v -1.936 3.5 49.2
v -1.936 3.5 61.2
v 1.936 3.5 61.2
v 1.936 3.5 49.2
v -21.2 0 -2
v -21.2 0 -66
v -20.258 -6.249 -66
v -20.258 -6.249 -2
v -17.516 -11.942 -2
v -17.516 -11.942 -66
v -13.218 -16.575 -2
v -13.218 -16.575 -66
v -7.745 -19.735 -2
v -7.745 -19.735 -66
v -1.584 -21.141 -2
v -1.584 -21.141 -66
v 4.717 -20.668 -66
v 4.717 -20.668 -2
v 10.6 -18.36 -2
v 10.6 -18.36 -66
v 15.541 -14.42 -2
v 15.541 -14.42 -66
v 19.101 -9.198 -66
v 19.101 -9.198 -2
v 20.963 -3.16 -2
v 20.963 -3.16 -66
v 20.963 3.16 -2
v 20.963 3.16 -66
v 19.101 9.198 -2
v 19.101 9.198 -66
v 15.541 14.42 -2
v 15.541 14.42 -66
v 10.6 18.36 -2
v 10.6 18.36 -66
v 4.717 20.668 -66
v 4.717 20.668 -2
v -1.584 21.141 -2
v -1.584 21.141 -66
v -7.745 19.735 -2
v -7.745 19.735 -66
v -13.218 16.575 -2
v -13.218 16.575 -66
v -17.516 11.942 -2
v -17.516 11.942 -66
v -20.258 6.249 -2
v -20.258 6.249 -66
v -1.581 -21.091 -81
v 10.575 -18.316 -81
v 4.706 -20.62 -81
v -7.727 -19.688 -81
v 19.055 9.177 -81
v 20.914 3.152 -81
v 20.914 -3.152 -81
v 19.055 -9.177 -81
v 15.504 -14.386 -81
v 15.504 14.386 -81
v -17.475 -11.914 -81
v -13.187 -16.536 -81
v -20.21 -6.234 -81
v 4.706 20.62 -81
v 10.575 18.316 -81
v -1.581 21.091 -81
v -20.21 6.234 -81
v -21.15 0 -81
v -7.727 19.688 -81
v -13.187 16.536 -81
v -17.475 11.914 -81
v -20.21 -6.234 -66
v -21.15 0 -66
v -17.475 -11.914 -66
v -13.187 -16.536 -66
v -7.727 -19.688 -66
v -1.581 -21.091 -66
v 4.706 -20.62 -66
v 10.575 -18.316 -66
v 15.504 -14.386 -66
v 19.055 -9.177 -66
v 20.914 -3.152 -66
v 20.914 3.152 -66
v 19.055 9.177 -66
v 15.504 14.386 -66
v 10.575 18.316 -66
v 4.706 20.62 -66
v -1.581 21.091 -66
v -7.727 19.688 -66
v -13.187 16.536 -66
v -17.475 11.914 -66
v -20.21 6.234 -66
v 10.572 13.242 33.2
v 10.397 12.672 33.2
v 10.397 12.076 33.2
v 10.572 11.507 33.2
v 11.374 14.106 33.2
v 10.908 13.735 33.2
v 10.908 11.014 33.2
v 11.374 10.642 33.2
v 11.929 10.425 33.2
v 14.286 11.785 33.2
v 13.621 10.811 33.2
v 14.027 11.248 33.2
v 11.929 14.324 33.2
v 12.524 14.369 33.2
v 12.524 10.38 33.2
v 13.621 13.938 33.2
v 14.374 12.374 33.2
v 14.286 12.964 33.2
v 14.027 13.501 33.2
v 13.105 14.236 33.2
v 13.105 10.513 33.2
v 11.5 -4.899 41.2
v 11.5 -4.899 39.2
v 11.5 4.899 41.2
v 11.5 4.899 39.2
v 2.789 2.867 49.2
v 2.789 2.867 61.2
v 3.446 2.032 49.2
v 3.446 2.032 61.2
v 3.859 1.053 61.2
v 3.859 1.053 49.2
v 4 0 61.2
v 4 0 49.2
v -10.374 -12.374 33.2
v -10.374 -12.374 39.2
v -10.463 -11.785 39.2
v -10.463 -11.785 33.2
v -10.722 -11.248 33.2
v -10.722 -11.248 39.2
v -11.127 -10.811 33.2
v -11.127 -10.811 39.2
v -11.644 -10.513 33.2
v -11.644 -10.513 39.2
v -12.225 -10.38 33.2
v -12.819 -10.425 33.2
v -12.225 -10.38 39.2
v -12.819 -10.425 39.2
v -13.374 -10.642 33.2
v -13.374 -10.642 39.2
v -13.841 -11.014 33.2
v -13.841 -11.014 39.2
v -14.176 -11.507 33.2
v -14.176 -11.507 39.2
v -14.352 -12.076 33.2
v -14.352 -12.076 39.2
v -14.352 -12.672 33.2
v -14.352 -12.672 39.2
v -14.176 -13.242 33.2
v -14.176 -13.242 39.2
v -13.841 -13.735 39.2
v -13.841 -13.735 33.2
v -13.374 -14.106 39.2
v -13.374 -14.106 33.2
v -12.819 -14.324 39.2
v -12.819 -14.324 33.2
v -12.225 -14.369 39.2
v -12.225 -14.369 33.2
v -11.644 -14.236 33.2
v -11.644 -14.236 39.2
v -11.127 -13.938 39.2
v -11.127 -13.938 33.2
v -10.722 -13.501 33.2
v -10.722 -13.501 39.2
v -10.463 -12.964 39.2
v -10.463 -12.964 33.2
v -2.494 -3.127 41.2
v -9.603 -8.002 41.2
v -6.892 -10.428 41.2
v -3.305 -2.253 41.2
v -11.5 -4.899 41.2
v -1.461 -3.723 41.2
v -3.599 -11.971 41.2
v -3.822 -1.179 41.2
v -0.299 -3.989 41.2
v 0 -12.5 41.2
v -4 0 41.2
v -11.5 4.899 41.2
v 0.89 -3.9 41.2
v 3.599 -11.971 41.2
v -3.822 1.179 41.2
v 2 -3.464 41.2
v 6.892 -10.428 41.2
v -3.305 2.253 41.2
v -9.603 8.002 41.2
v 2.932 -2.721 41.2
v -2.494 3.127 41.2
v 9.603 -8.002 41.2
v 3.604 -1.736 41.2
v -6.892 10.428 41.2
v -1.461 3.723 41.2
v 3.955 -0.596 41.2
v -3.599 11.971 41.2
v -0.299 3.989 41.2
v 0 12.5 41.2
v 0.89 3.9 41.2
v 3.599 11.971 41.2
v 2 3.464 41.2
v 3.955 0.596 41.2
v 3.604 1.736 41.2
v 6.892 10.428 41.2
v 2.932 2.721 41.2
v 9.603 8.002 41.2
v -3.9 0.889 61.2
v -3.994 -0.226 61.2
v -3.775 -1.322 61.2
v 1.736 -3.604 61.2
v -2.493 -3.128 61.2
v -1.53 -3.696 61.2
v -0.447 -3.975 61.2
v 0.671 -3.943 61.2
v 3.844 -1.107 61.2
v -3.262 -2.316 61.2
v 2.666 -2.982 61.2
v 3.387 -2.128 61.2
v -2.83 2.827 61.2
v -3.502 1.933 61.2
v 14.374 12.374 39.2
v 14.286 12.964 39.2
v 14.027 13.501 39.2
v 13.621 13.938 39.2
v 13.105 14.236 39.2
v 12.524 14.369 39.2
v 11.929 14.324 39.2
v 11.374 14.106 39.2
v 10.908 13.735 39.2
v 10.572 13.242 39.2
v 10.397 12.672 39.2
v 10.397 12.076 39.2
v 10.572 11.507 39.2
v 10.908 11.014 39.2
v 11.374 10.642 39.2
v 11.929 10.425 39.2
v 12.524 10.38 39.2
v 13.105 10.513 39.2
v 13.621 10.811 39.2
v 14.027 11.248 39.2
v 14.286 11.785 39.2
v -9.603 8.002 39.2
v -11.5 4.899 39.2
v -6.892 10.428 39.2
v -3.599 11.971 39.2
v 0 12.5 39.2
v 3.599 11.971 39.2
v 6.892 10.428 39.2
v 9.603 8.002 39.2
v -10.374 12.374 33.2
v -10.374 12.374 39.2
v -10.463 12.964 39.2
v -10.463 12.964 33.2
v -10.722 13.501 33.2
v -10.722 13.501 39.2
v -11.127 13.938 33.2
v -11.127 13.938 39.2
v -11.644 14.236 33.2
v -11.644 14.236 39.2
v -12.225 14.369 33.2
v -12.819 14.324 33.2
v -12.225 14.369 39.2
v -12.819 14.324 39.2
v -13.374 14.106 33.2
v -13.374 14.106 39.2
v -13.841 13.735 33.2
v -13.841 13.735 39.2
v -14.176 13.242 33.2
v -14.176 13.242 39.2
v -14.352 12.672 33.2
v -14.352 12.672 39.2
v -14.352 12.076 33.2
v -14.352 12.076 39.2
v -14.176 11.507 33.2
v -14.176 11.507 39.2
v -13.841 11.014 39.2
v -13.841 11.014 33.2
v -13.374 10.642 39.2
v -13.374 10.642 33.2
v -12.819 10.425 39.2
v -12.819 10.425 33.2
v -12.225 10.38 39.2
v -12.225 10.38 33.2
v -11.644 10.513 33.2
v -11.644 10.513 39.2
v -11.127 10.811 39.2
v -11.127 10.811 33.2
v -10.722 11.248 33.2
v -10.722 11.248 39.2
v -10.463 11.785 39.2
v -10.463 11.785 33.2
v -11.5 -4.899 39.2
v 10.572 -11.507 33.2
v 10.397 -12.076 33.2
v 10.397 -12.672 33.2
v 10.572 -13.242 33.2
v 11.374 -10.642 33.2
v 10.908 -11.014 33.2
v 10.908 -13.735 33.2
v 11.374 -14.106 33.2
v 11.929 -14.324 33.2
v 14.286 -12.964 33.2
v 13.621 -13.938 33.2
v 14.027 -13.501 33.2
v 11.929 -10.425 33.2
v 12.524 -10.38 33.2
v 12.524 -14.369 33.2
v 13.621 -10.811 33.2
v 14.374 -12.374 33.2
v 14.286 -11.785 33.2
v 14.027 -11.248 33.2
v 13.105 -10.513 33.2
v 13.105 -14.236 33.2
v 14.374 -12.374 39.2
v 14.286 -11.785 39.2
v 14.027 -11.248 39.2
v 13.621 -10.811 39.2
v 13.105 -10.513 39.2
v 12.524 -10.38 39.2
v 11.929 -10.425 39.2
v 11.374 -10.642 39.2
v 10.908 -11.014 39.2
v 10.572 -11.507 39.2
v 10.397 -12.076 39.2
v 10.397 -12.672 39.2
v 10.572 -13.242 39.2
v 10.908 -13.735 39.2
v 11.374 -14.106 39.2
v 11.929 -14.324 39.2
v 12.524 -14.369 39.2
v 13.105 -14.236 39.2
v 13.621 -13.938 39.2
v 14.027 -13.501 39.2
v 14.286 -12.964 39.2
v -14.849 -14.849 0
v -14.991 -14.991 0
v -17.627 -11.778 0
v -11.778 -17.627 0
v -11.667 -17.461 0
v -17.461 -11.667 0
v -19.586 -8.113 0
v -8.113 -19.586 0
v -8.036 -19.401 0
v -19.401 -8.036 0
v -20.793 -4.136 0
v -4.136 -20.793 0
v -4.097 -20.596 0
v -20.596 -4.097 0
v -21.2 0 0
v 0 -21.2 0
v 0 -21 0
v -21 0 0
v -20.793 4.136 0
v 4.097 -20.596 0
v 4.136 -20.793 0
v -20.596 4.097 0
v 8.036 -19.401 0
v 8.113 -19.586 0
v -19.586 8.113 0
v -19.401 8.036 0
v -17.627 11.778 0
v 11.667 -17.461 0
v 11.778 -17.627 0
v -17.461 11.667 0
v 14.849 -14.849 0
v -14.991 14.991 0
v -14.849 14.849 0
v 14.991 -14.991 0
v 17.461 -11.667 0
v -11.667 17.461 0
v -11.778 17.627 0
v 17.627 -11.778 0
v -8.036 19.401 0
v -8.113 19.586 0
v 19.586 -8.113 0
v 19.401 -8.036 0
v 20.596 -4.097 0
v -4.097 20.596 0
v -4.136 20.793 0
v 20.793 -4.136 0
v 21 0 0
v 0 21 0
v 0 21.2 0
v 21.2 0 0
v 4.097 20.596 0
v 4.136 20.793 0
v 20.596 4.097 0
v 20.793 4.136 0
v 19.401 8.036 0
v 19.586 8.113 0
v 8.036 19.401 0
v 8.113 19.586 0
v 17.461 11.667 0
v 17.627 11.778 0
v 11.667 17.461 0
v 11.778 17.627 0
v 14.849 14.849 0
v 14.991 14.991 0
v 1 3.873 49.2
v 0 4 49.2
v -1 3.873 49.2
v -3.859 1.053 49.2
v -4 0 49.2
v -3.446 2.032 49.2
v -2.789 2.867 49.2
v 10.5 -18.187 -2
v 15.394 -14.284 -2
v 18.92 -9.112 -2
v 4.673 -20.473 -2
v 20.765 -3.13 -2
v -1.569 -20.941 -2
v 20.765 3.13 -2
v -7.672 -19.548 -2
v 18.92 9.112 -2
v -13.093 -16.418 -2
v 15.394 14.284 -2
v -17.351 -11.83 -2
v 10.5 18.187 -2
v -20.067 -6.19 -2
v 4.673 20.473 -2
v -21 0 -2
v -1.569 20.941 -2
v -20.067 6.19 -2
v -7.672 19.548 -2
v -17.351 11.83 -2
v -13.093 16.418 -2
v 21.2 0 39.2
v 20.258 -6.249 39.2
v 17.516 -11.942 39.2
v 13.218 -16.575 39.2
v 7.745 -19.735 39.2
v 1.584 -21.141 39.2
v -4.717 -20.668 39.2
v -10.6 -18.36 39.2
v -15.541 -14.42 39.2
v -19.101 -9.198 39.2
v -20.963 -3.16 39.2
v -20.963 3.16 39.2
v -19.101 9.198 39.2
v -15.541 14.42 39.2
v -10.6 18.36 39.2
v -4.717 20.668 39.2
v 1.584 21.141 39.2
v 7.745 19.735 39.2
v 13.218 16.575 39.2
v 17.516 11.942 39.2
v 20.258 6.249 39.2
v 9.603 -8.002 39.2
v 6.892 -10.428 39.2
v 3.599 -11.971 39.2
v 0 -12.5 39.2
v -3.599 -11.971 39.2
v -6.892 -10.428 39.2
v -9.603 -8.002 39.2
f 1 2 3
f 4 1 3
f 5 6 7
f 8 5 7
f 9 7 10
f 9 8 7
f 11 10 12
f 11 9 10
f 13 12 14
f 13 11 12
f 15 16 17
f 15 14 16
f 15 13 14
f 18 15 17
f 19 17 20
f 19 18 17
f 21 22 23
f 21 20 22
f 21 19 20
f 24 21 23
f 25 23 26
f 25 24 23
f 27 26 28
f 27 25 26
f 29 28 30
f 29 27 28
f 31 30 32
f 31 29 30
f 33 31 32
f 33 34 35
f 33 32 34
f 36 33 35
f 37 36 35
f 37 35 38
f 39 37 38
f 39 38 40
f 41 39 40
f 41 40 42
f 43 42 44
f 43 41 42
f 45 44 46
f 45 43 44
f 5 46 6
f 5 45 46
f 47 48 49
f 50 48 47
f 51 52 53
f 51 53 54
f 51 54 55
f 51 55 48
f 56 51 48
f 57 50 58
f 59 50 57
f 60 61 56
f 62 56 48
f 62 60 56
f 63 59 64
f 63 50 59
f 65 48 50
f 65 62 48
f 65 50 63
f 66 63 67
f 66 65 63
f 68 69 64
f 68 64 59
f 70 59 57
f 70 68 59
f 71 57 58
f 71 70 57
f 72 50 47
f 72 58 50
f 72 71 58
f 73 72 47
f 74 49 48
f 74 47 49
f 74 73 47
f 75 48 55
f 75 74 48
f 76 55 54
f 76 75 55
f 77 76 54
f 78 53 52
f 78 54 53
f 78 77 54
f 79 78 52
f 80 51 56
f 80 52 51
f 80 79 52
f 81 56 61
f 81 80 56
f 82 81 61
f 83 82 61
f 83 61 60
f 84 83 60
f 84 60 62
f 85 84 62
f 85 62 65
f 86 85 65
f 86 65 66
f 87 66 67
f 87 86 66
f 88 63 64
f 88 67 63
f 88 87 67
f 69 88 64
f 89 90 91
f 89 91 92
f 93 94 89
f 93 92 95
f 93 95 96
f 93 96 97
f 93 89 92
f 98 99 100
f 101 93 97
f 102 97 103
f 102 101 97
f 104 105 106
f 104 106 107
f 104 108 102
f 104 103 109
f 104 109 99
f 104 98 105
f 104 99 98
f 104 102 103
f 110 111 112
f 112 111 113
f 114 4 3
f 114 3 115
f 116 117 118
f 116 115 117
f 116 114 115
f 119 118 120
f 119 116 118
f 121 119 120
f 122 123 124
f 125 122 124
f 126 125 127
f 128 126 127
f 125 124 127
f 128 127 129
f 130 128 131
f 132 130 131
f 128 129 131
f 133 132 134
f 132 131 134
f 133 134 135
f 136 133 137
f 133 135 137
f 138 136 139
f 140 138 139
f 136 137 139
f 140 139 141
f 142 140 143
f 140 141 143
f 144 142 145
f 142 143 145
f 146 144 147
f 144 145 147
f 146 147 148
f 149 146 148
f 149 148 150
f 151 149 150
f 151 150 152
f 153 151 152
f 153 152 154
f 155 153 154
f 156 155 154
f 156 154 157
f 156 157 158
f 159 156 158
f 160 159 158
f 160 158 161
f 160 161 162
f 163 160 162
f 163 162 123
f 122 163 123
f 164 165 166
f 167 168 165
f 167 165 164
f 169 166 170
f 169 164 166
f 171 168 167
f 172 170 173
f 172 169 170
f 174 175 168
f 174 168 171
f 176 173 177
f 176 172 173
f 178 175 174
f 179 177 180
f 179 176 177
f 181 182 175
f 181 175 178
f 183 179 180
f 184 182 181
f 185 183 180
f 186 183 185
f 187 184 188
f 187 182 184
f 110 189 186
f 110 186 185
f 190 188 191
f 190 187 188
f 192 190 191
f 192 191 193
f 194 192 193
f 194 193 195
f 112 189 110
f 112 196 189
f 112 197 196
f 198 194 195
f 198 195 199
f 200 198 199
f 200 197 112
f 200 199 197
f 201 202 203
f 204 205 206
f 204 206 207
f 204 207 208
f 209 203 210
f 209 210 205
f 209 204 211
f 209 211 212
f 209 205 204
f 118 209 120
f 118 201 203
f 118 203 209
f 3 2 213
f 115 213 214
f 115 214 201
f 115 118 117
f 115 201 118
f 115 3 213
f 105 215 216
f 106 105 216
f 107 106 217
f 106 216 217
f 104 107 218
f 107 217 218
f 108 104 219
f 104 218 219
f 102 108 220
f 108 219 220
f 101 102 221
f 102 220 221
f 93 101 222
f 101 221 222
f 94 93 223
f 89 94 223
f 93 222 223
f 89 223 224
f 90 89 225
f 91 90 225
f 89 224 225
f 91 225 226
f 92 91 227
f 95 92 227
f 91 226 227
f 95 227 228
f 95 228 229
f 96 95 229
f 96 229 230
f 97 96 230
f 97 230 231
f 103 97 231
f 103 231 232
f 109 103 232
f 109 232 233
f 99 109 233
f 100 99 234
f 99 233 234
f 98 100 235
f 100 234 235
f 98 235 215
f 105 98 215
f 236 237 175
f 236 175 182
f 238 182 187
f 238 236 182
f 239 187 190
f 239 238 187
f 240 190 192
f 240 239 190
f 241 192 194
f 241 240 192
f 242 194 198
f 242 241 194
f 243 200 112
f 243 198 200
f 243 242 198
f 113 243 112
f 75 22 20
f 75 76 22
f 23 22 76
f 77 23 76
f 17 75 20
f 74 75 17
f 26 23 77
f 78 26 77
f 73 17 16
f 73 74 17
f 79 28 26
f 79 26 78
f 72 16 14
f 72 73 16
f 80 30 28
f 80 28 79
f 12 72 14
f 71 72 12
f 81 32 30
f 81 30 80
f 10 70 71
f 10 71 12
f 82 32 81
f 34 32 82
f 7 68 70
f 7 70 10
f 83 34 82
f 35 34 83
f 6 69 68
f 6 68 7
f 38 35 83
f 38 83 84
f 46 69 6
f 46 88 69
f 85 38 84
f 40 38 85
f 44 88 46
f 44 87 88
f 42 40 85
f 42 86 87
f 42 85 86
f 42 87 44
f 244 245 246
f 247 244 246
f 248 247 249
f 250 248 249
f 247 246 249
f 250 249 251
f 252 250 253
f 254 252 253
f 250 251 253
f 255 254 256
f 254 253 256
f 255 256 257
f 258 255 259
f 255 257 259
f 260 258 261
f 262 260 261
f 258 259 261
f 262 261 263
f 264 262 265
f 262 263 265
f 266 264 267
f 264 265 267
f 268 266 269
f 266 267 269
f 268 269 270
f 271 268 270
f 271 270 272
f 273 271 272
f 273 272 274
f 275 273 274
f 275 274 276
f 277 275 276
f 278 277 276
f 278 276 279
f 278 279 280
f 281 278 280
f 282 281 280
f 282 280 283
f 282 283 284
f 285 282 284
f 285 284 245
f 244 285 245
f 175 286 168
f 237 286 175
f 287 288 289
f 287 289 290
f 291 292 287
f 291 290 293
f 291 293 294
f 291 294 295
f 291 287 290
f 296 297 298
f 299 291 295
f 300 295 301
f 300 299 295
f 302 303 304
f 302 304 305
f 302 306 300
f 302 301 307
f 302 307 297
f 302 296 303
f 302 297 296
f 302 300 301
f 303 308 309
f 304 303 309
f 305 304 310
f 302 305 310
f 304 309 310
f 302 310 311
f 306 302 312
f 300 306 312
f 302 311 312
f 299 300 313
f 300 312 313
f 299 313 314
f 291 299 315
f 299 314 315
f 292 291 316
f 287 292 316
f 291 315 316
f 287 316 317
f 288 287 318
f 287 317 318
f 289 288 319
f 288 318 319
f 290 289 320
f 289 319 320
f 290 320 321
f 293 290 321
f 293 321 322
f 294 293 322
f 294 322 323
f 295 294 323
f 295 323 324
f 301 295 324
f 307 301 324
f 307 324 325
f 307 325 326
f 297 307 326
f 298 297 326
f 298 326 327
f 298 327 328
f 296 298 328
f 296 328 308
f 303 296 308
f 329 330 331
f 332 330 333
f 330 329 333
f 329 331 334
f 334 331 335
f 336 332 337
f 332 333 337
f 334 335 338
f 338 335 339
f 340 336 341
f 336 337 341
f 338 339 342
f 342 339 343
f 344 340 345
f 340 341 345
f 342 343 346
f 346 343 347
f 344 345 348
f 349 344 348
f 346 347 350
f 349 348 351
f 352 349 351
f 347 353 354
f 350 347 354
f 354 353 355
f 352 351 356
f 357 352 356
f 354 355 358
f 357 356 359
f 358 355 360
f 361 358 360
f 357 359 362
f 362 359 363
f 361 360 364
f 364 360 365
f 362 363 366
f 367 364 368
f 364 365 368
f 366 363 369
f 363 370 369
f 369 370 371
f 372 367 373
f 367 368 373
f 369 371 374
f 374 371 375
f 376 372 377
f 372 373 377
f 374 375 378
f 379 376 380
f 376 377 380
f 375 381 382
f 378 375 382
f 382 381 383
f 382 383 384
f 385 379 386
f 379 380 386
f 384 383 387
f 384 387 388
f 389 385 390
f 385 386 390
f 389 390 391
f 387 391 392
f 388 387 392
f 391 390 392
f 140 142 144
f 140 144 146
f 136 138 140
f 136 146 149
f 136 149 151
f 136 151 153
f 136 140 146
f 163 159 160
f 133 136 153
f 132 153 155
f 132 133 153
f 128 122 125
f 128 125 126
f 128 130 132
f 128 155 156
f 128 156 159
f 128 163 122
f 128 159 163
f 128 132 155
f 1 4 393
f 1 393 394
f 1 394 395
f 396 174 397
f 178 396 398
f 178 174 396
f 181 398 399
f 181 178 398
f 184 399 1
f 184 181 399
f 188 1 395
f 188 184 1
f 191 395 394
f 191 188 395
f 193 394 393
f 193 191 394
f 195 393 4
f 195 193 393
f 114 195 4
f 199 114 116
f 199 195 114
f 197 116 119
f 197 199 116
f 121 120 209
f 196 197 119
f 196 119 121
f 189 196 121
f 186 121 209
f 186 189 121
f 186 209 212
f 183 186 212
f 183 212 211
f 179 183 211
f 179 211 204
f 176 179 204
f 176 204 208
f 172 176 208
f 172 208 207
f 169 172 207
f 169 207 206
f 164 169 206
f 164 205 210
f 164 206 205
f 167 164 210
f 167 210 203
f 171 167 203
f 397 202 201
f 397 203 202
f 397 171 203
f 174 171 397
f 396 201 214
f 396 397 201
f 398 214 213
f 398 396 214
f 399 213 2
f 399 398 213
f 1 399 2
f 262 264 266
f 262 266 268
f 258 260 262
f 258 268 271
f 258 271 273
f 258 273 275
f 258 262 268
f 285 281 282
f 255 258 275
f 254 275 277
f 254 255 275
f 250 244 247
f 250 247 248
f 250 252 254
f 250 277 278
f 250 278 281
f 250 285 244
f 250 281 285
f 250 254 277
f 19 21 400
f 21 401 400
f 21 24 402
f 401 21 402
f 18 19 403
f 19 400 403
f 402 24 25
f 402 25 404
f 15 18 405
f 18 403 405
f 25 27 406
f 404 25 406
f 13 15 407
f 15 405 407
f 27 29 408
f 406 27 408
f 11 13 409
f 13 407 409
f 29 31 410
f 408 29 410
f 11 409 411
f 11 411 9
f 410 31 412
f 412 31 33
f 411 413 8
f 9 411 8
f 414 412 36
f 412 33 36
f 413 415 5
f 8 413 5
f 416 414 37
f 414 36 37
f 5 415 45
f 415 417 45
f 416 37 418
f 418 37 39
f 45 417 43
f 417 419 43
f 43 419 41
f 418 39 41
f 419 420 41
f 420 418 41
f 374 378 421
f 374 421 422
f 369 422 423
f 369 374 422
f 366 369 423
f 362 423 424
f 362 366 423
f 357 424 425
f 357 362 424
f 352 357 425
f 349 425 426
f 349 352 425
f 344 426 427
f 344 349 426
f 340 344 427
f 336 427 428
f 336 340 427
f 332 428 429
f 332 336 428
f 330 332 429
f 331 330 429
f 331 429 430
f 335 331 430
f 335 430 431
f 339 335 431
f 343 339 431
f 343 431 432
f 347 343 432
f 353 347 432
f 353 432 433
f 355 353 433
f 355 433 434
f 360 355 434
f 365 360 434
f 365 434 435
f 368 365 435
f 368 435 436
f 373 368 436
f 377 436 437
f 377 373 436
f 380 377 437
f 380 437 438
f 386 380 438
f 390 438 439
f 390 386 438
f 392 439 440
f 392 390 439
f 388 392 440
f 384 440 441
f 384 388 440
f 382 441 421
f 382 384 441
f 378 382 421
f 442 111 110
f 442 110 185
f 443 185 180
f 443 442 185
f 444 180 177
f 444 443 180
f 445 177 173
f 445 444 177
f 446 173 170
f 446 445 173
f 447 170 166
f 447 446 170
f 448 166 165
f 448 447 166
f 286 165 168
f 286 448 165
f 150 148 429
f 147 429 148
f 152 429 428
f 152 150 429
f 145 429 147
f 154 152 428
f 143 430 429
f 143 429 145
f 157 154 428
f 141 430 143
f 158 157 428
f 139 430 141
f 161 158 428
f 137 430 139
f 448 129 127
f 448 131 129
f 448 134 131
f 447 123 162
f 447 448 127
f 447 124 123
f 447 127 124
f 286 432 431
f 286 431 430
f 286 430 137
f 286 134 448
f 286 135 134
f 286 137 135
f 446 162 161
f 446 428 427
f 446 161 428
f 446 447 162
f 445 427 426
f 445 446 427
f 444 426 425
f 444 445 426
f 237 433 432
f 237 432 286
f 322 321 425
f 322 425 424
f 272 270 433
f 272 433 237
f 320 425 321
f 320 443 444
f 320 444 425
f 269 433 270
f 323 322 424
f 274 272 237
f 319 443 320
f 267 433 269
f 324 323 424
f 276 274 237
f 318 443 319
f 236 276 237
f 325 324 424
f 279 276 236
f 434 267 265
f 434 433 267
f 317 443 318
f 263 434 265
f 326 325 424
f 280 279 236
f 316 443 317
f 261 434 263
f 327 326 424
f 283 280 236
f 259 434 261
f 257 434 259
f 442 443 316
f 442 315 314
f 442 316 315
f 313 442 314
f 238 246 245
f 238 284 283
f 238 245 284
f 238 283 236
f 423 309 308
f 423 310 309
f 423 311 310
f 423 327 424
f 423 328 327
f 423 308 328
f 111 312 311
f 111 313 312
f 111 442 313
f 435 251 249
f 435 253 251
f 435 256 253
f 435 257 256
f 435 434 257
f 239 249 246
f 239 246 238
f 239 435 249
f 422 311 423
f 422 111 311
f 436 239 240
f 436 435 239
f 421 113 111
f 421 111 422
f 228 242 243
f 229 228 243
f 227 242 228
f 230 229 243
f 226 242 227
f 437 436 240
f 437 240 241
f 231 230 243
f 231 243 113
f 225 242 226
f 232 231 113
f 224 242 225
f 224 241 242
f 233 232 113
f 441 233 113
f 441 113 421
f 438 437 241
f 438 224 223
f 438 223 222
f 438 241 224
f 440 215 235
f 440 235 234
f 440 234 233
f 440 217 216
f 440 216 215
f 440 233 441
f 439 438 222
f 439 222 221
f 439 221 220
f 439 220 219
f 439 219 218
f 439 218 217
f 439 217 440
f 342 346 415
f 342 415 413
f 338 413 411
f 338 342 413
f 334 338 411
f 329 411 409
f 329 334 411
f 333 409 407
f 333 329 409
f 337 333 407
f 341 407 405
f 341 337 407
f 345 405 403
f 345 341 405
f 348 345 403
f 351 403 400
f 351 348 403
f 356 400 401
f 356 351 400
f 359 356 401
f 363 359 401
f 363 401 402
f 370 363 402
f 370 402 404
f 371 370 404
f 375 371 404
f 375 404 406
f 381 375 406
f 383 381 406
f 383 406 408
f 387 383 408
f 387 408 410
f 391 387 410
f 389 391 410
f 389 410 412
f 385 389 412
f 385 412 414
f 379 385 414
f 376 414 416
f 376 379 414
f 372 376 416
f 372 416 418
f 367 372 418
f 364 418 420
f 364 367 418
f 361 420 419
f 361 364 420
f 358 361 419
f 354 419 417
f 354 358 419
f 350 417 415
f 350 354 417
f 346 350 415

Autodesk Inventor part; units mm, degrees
ref_plane "YZ Plane" through (0, 0, 0) normal (1, 0, 0) x (0, 1, 0)
ref_plane "XZ Plane" through (0, 0, 0) normal (0, 1, 0) x (-1, 0, 0)
ref_plane "XY Plane" through (0, 0, 0) normal (0, 0, 1) x (1, 0, 0)
sketch "스케치1" plane through (0, 0, 0) normal (0, 0, 1) x (1, 0, 0)
  circle A0 centre (0, 0) radius 21.2
  dimension "d0" = 42.4
extrude "돌출1" add sketch "스케치1" along normal blind 39.2
sketch "스케치2" plane through (0, 0, 0) normal (0, 0, -1) x (-1, 0, 0)
  circle A0 centre (0, 0) radius 21
  dimension "d5" = 42
extrude "돌출2" add sketch "스케치2" along normal blind 2
sketch "스케치3" plane through (0, 0, -2) normal (0, 0, -1) x (-1, 0, 0)
  circle A0 centre (0, 0) radius 21.2
extrude "돌출3" add sketch "스케치3" along normal blind 64
sketch "스케치4" plane through (0, 0, -66) normal (0, 0, -1) x (-1, 0, 0)
  circle A0 centre (0, 0) radius 21.15
  dimension "d19" = 42.3
extrude "돌출4" add sketch "스케치4" along normal blind 15
sketch "스케치5" plane through (0, 0, 39.2) normal (0, 0, 1) x (1, 0, 0)
  circle A0 centre (0, 0) radius 12.5
  line L0 (0, 0) -> (11.5, 0)
  line L1 (11.5, 0) -> (11.5, 4.899)
  line L2 (11.5, 0) -> (11.5, -4.899)
  line L3 (0, 0) -> (-11.5, 0)
  line L4 (-11.5, 0) -> (-11.5, 4.899)
  line L5 (-11.5, 0) -> (-11.5, -4.899)
  dimension "d10" = 25
  dimension "d20" = 11.5
  dimension "d21" = 11.5
extrude "돌출5" add sketch "스케치5" along normal blind 2 contours L1 L0 L3 L4 A0 | A0 L5 L3 L0 L2
sketch "스케치6" plane through (0, 0, 41.2) normal (0, 0, 1) x (-1, 0, 0)
  circle A0 centre (0, 0) radius 4
  dimension "d13" = 8
extrude "돌출6" add sketch "스케치6" along normal blind 8
sketch "스케치7" plane through (0, 0, 49.2) normal (0, 0, 1) x (1, 0, 0)
  line L0 (0, 0) -> (0, 3.5)
  line L1 (0, 3.5) -> (1.9365, 3.5)
  circle A0 centre (0, 0) radius 4 projected
  line L2 (0, 3.5) -> (-1.9365, 3.5)
  arc A1 (-1.9365, 3.5) -> (1.9365, 3.5) centre (0, 0) ccw
  dimension "d16" = 3.5
extrude "돌출7" add sketch "스케치7" along normal blind 12 contours L1 A0 L2 picked at (-0.0999, -1.4777)
sketch "스케치8" plane through (0, 0, 39.2) normal (0, 0, 1) x (1, 0, 0)
  arc A0 (11.5, 4.899) -> (-11.5, 4.899) centre (0, 0) ccw projected
  line L0 (11.5, 4.899) -> (11.5, -4.899) projected
  arc A1 (-11.5, -4.899) -> (11.5, -4.899) centre (0, 0) ccw projected
  line L1 (-11.5, -4.899) -> (-11.5, 4.899) projected
  circle A2 centre (0, 0) radius 21.2 projected
  line L2 (0, 0) -> (12.3744, 12.3744)
  line L3 (0, 0) -> (17.5, 0) construction
  circle A3 centre (12.3744, 12.3744) radius 2
  circle A4 centre (-12.3744, 12.3744) radius 2
  circle A5 centre (-12.3744, -12.3744) radius 2
  circle A6 centre (12.3744, -12.3744) radius 2
  dimension "d22" = 17.5
  dimension "d23" = 45
  dimension "d24" = 4
  dimension "d27" = 360
extrude "돌출8" cut sketch "스케치8" against normal blind 6 contours A3 | A4 | A5 | A6
thread "스레드1" size "M4x0.7" class "6H" standard "ANSI Metric M Profile" full length
thread "스레드2" size "M4x0.7" class "6H" standard "ANSI Metric M Profile" full length
thread "스레드3" size "M4x0.7" class "6H" standard "ANSI Metric M Profile" full length
thread "스레드4" size "M4x0.7" class "6H" standard "ANSI Metric M Profile" full length
properties part number "IG-42GM_motor"
